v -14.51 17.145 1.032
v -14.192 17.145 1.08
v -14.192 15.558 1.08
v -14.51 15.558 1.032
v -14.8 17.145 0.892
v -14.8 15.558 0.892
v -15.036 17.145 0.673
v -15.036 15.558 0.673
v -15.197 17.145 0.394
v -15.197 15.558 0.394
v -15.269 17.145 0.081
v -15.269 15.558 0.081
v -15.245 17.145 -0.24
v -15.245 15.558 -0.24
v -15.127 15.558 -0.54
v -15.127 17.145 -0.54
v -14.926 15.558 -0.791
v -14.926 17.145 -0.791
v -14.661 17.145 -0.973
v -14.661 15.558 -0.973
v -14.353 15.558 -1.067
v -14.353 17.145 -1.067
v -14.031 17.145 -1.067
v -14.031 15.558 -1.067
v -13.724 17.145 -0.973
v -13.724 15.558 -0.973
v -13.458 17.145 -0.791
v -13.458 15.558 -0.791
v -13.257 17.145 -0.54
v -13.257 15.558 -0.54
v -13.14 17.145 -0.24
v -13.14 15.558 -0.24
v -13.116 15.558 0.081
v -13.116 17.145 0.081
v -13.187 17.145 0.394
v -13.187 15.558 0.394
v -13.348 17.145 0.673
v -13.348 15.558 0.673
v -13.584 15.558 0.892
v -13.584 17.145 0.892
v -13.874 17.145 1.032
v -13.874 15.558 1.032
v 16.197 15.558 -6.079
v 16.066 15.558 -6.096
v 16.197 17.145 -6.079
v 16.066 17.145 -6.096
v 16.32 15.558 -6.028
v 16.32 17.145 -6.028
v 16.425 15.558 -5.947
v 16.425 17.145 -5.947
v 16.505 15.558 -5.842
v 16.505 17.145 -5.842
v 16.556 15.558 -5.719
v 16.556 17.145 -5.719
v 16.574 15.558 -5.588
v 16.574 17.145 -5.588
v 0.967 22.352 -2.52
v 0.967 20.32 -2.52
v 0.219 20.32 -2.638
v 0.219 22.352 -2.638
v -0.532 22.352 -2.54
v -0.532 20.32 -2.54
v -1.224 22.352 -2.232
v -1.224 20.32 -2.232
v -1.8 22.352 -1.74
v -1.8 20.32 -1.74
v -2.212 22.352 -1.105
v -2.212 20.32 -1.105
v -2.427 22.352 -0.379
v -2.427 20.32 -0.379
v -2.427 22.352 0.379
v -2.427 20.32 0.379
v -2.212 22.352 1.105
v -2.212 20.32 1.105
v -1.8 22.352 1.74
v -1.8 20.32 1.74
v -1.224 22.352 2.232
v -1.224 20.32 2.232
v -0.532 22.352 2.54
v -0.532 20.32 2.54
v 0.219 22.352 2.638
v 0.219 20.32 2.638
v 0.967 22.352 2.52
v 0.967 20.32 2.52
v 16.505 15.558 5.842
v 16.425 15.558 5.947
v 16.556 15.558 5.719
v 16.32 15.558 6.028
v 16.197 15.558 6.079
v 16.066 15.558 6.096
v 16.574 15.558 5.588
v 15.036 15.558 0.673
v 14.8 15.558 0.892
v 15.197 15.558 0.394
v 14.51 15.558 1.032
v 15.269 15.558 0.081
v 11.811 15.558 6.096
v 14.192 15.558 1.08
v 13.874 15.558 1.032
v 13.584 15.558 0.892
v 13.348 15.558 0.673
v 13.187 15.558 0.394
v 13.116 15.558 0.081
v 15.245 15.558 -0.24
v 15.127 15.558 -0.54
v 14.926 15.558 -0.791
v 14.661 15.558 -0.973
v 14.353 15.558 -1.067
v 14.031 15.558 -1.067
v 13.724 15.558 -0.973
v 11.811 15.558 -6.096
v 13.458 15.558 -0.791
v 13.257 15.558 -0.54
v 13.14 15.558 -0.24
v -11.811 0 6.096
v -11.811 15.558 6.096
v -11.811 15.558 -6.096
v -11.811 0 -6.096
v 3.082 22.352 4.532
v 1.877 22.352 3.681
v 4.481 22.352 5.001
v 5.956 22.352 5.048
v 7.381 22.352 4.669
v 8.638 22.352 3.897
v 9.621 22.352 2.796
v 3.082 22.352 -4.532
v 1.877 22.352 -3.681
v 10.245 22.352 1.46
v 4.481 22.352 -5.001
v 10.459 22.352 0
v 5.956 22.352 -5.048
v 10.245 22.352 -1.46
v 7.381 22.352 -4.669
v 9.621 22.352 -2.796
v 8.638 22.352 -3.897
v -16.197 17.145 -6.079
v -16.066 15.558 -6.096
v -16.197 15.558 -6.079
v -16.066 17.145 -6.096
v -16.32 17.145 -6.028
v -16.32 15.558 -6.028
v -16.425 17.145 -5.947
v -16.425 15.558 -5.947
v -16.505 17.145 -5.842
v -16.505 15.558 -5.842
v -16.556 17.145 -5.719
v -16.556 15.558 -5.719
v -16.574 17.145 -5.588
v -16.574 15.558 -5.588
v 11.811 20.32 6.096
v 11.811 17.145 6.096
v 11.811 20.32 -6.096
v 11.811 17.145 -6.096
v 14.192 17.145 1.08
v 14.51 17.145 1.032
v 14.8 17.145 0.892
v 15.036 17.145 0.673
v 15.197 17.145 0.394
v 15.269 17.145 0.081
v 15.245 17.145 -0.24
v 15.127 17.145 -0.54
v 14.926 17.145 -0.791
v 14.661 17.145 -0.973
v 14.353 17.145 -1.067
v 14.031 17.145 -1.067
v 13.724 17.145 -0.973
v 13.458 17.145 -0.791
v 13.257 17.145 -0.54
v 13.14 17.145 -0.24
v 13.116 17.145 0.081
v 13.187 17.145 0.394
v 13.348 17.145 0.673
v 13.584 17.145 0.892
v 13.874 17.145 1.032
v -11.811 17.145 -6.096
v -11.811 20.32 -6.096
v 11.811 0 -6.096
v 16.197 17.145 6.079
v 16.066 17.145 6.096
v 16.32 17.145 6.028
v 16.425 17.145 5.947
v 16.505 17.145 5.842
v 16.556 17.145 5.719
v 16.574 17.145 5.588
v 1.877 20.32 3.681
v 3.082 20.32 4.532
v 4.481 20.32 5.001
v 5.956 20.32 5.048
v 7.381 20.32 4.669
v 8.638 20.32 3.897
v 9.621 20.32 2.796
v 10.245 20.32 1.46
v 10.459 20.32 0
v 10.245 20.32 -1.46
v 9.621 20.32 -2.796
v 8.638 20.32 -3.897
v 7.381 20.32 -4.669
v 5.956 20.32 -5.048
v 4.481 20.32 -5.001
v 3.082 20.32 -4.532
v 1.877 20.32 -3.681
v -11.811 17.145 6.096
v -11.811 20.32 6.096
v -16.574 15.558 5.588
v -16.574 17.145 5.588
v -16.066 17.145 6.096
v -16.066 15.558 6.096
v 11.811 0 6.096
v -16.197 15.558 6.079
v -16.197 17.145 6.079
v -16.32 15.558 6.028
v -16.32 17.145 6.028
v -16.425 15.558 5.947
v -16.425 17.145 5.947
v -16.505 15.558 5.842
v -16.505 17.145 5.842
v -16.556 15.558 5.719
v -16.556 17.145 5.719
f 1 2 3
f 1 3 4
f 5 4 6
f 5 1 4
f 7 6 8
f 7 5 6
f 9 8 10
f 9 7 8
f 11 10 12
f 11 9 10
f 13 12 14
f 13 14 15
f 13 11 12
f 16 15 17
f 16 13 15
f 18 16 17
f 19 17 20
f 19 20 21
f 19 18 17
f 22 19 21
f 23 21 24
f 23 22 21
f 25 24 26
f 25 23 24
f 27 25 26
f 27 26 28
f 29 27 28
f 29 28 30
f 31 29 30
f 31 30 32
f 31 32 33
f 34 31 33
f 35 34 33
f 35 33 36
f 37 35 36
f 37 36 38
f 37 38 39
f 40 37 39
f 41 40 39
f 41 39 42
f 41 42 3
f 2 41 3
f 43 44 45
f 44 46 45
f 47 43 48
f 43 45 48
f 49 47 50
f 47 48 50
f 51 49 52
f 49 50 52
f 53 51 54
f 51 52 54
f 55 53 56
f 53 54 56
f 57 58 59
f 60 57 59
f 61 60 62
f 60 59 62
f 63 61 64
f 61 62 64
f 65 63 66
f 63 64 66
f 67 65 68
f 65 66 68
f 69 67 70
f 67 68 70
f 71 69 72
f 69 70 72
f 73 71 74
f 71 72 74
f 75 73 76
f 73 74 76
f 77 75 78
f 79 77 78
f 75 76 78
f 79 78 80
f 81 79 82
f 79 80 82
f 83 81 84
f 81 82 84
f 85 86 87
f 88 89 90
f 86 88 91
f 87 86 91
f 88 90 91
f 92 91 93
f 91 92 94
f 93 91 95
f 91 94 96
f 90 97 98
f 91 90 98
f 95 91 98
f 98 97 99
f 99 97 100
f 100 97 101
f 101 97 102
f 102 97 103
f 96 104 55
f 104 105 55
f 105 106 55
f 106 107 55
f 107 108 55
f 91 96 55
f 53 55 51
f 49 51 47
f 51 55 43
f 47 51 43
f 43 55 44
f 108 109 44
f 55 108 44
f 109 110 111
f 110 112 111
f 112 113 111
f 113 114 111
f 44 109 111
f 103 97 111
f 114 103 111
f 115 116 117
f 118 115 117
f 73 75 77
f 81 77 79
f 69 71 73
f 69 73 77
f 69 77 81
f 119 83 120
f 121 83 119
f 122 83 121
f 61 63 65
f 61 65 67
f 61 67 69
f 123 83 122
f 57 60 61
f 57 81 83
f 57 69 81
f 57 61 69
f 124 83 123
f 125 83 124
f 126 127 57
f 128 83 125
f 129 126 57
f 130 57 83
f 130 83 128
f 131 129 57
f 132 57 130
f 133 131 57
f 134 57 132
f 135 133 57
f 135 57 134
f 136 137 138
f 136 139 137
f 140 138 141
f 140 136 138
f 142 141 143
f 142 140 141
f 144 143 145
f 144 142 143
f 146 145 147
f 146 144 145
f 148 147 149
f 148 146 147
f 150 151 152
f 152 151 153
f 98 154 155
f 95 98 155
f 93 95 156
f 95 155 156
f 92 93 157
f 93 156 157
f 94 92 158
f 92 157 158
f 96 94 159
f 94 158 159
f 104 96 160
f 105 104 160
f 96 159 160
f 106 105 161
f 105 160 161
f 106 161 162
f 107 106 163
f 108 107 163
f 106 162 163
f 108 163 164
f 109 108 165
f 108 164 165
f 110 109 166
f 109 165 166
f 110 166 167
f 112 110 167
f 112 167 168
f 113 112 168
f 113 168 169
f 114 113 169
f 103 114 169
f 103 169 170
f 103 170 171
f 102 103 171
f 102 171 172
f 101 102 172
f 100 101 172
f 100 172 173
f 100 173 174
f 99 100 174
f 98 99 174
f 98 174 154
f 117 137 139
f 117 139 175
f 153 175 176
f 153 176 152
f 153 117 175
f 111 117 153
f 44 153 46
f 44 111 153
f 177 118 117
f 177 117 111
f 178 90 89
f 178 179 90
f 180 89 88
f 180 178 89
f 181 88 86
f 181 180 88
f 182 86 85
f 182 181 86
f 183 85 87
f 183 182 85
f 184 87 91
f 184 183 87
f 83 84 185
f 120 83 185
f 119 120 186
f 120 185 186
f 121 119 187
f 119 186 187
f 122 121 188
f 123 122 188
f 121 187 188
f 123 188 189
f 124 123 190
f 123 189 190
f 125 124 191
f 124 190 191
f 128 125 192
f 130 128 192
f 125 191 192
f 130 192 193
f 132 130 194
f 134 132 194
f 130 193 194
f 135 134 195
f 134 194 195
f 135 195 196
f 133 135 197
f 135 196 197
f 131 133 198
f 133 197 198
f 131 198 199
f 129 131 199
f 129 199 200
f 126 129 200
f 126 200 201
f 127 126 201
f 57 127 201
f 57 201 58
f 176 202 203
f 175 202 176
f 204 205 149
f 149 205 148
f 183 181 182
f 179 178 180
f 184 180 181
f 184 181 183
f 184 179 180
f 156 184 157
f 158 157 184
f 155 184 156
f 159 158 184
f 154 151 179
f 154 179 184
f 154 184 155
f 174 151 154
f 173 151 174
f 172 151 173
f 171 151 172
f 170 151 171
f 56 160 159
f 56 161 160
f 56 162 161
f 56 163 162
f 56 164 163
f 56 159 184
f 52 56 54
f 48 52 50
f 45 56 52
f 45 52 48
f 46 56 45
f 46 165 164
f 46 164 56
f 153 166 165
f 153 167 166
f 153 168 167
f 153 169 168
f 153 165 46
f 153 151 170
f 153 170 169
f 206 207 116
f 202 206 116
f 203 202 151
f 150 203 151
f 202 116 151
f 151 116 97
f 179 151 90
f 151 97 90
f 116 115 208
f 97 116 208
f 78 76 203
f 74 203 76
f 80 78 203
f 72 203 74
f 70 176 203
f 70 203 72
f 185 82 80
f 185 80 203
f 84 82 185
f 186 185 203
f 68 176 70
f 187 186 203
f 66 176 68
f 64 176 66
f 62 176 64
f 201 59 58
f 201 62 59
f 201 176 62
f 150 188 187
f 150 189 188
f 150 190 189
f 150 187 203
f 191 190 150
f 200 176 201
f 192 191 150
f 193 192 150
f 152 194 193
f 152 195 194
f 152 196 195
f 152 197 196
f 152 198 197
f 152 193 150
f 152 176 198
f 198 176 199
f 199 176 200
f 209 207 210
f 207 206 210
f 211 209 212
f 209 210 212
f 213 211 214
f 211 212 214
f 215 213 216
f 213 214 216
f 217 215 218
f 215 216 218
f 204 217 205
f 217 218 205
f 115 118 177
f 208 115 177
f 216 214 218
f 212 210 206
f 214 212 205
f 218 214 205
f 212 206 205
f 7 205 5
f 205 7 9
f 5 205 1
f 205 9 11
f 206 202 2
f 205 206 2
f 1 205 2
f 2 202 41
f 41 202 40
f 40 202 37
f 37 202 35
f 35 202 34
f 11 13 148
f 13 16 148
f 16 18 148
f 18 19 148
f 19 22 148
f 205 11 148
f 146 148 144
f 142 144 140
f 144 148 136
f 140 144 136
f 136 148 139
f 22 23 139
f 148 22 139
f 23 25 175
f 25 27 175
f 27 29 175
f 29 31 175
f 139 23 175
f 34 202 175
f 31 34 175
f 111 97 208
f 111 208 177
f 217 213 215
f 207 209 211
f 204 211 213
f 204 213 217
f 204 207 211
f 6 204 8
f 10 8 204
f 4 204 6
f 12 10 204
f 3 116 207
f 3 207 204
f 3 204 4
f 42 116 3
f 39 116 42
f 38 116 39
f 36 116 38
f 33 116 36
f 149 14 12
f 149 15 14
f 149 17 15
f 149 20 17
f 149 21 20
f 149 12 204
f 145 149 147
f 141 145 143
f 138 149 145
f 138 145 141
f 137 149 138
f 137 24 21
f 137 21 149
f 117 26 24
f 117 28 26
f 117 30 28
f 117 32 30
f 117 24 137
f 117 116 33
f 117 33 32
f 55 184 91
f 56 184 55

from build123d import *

# Parameters (mm, degrees)
SKETCH1_W           = 23.622
SKETCH1_H           = 12.192
BOSS_EXTRUDE1_DEPTH = 20.32
SKETCH2_R           = 5.080697271
BOSS_EXTRUDE2_DEPTH = 2.032
SKETCH3_W           = 12.192
SKETCH3_H           = 1.5875
BOSS_EXTRUDE3_DEPTH = 4.7625
CUT_EXTRUDE1_REACH  = 26.613
SKETCH5_R           = 1.0795
FILLET1_R           = 0.508


with BuildPart() as part:
    # Sketch1 → Boss-Extrude1 (new body)
    with BuildSketch(Plane(origin=(0, 0, 0), x_dir=(1, 0, 0), z_dir=(0, 1, 0))):
        Rectangle(SKETCH1_W, SKETCH1_H)
    extrude(amount=BOSS_EXTRUDE1_DEPTH)

    # Sketch2 → Boss-Extrude2 (add)
    with BuildSketch(Plane(origin=(0, 20.32, 0), x_dir=(1, 0, 0), z_dir=(0, 1, 0))):
        with Locations((5.378708036, 0)):
            Circle(SKETCH2_R)
        with BuildLine():
            ThreePointArc((0.966939793, -2.519878116), (0.298010766, 0), (0.966939793, 2.519878116))
            ThreePointArc((0.966939793, 2.519878116), (-2.454485361, 0), (0.966939793, -2.519878116))
        make_face()
    extrude(amount=BOSS_EXTRUDE2_DEPTH)

    # Sketch3 → Boss-Extrude3 (add)
    with BuildSketch(Plane(origin=(11.811, 0, 0), x_dir=(0, 0, -1), z_dir=(1, 0, 0))):
        with Locations((0, 16.35125)):
            Rectangle(SKETCH3_W, SKETCH3_H)
    boss_extrude3 = extrude(amount=BOSS_EXTRUDE3_DEPTH)

    # Sketch5 → Cut-Extrude1 (cut, up to next)
    with BuildSketch(Plane(origin=(0, 17.145, 0), x_dir=(1, 0, 0), z_dir=(0, 1, 0)), mode=Mode.PRIVATE) as cut_extrude1_sk1:
        with Locations(Location((14.19225, 0, 0), (0, 0, 270))):
            Circle(SKETCH5_R)
    cut_extrude1_tool1 = extrude(cut_extrude1_sk1.sketch, amount=-CUT_EXTRUDE1_REACH, mode=Mode.PRIVATE) & part.part
    cut_extrude1 = cut_extrude1_tool1.solids().sort_by_distance((14.19225, 17.145, 0))[0]
    add(cut_extrude1, mode=Mode.SUBTRACT)

    # Mirror1: Boss-Extrude3, Cut-Extrude1 across plane
    add(boss_extrude3.mirror(Plane(origin=(0, 0, 0), x_dir=(0, 0, 1), z_dir=(1, 0, 0))))
    add(cut_extrude1.mirror(Plane(origin=(0, 0, 0), x_dir=(0, 0, 1), z_dir=(1, 0, 0))), mode=Mode.SUBTRACT)

    # Fillet1
    fillet1_edges = [part.edges().sort_by_distance(p)[0] for p in [
        (16.5735, 16.35125, 6.096),
        (16.5735, 16.35125, -6.096),
        (-16.5735, 16.35125, 6.096),
        (-16.5735, 16.35125, -6.096),
    ]]
    fillet(fillet1_edges, radius=FILLET1_R)


solid = part.part
